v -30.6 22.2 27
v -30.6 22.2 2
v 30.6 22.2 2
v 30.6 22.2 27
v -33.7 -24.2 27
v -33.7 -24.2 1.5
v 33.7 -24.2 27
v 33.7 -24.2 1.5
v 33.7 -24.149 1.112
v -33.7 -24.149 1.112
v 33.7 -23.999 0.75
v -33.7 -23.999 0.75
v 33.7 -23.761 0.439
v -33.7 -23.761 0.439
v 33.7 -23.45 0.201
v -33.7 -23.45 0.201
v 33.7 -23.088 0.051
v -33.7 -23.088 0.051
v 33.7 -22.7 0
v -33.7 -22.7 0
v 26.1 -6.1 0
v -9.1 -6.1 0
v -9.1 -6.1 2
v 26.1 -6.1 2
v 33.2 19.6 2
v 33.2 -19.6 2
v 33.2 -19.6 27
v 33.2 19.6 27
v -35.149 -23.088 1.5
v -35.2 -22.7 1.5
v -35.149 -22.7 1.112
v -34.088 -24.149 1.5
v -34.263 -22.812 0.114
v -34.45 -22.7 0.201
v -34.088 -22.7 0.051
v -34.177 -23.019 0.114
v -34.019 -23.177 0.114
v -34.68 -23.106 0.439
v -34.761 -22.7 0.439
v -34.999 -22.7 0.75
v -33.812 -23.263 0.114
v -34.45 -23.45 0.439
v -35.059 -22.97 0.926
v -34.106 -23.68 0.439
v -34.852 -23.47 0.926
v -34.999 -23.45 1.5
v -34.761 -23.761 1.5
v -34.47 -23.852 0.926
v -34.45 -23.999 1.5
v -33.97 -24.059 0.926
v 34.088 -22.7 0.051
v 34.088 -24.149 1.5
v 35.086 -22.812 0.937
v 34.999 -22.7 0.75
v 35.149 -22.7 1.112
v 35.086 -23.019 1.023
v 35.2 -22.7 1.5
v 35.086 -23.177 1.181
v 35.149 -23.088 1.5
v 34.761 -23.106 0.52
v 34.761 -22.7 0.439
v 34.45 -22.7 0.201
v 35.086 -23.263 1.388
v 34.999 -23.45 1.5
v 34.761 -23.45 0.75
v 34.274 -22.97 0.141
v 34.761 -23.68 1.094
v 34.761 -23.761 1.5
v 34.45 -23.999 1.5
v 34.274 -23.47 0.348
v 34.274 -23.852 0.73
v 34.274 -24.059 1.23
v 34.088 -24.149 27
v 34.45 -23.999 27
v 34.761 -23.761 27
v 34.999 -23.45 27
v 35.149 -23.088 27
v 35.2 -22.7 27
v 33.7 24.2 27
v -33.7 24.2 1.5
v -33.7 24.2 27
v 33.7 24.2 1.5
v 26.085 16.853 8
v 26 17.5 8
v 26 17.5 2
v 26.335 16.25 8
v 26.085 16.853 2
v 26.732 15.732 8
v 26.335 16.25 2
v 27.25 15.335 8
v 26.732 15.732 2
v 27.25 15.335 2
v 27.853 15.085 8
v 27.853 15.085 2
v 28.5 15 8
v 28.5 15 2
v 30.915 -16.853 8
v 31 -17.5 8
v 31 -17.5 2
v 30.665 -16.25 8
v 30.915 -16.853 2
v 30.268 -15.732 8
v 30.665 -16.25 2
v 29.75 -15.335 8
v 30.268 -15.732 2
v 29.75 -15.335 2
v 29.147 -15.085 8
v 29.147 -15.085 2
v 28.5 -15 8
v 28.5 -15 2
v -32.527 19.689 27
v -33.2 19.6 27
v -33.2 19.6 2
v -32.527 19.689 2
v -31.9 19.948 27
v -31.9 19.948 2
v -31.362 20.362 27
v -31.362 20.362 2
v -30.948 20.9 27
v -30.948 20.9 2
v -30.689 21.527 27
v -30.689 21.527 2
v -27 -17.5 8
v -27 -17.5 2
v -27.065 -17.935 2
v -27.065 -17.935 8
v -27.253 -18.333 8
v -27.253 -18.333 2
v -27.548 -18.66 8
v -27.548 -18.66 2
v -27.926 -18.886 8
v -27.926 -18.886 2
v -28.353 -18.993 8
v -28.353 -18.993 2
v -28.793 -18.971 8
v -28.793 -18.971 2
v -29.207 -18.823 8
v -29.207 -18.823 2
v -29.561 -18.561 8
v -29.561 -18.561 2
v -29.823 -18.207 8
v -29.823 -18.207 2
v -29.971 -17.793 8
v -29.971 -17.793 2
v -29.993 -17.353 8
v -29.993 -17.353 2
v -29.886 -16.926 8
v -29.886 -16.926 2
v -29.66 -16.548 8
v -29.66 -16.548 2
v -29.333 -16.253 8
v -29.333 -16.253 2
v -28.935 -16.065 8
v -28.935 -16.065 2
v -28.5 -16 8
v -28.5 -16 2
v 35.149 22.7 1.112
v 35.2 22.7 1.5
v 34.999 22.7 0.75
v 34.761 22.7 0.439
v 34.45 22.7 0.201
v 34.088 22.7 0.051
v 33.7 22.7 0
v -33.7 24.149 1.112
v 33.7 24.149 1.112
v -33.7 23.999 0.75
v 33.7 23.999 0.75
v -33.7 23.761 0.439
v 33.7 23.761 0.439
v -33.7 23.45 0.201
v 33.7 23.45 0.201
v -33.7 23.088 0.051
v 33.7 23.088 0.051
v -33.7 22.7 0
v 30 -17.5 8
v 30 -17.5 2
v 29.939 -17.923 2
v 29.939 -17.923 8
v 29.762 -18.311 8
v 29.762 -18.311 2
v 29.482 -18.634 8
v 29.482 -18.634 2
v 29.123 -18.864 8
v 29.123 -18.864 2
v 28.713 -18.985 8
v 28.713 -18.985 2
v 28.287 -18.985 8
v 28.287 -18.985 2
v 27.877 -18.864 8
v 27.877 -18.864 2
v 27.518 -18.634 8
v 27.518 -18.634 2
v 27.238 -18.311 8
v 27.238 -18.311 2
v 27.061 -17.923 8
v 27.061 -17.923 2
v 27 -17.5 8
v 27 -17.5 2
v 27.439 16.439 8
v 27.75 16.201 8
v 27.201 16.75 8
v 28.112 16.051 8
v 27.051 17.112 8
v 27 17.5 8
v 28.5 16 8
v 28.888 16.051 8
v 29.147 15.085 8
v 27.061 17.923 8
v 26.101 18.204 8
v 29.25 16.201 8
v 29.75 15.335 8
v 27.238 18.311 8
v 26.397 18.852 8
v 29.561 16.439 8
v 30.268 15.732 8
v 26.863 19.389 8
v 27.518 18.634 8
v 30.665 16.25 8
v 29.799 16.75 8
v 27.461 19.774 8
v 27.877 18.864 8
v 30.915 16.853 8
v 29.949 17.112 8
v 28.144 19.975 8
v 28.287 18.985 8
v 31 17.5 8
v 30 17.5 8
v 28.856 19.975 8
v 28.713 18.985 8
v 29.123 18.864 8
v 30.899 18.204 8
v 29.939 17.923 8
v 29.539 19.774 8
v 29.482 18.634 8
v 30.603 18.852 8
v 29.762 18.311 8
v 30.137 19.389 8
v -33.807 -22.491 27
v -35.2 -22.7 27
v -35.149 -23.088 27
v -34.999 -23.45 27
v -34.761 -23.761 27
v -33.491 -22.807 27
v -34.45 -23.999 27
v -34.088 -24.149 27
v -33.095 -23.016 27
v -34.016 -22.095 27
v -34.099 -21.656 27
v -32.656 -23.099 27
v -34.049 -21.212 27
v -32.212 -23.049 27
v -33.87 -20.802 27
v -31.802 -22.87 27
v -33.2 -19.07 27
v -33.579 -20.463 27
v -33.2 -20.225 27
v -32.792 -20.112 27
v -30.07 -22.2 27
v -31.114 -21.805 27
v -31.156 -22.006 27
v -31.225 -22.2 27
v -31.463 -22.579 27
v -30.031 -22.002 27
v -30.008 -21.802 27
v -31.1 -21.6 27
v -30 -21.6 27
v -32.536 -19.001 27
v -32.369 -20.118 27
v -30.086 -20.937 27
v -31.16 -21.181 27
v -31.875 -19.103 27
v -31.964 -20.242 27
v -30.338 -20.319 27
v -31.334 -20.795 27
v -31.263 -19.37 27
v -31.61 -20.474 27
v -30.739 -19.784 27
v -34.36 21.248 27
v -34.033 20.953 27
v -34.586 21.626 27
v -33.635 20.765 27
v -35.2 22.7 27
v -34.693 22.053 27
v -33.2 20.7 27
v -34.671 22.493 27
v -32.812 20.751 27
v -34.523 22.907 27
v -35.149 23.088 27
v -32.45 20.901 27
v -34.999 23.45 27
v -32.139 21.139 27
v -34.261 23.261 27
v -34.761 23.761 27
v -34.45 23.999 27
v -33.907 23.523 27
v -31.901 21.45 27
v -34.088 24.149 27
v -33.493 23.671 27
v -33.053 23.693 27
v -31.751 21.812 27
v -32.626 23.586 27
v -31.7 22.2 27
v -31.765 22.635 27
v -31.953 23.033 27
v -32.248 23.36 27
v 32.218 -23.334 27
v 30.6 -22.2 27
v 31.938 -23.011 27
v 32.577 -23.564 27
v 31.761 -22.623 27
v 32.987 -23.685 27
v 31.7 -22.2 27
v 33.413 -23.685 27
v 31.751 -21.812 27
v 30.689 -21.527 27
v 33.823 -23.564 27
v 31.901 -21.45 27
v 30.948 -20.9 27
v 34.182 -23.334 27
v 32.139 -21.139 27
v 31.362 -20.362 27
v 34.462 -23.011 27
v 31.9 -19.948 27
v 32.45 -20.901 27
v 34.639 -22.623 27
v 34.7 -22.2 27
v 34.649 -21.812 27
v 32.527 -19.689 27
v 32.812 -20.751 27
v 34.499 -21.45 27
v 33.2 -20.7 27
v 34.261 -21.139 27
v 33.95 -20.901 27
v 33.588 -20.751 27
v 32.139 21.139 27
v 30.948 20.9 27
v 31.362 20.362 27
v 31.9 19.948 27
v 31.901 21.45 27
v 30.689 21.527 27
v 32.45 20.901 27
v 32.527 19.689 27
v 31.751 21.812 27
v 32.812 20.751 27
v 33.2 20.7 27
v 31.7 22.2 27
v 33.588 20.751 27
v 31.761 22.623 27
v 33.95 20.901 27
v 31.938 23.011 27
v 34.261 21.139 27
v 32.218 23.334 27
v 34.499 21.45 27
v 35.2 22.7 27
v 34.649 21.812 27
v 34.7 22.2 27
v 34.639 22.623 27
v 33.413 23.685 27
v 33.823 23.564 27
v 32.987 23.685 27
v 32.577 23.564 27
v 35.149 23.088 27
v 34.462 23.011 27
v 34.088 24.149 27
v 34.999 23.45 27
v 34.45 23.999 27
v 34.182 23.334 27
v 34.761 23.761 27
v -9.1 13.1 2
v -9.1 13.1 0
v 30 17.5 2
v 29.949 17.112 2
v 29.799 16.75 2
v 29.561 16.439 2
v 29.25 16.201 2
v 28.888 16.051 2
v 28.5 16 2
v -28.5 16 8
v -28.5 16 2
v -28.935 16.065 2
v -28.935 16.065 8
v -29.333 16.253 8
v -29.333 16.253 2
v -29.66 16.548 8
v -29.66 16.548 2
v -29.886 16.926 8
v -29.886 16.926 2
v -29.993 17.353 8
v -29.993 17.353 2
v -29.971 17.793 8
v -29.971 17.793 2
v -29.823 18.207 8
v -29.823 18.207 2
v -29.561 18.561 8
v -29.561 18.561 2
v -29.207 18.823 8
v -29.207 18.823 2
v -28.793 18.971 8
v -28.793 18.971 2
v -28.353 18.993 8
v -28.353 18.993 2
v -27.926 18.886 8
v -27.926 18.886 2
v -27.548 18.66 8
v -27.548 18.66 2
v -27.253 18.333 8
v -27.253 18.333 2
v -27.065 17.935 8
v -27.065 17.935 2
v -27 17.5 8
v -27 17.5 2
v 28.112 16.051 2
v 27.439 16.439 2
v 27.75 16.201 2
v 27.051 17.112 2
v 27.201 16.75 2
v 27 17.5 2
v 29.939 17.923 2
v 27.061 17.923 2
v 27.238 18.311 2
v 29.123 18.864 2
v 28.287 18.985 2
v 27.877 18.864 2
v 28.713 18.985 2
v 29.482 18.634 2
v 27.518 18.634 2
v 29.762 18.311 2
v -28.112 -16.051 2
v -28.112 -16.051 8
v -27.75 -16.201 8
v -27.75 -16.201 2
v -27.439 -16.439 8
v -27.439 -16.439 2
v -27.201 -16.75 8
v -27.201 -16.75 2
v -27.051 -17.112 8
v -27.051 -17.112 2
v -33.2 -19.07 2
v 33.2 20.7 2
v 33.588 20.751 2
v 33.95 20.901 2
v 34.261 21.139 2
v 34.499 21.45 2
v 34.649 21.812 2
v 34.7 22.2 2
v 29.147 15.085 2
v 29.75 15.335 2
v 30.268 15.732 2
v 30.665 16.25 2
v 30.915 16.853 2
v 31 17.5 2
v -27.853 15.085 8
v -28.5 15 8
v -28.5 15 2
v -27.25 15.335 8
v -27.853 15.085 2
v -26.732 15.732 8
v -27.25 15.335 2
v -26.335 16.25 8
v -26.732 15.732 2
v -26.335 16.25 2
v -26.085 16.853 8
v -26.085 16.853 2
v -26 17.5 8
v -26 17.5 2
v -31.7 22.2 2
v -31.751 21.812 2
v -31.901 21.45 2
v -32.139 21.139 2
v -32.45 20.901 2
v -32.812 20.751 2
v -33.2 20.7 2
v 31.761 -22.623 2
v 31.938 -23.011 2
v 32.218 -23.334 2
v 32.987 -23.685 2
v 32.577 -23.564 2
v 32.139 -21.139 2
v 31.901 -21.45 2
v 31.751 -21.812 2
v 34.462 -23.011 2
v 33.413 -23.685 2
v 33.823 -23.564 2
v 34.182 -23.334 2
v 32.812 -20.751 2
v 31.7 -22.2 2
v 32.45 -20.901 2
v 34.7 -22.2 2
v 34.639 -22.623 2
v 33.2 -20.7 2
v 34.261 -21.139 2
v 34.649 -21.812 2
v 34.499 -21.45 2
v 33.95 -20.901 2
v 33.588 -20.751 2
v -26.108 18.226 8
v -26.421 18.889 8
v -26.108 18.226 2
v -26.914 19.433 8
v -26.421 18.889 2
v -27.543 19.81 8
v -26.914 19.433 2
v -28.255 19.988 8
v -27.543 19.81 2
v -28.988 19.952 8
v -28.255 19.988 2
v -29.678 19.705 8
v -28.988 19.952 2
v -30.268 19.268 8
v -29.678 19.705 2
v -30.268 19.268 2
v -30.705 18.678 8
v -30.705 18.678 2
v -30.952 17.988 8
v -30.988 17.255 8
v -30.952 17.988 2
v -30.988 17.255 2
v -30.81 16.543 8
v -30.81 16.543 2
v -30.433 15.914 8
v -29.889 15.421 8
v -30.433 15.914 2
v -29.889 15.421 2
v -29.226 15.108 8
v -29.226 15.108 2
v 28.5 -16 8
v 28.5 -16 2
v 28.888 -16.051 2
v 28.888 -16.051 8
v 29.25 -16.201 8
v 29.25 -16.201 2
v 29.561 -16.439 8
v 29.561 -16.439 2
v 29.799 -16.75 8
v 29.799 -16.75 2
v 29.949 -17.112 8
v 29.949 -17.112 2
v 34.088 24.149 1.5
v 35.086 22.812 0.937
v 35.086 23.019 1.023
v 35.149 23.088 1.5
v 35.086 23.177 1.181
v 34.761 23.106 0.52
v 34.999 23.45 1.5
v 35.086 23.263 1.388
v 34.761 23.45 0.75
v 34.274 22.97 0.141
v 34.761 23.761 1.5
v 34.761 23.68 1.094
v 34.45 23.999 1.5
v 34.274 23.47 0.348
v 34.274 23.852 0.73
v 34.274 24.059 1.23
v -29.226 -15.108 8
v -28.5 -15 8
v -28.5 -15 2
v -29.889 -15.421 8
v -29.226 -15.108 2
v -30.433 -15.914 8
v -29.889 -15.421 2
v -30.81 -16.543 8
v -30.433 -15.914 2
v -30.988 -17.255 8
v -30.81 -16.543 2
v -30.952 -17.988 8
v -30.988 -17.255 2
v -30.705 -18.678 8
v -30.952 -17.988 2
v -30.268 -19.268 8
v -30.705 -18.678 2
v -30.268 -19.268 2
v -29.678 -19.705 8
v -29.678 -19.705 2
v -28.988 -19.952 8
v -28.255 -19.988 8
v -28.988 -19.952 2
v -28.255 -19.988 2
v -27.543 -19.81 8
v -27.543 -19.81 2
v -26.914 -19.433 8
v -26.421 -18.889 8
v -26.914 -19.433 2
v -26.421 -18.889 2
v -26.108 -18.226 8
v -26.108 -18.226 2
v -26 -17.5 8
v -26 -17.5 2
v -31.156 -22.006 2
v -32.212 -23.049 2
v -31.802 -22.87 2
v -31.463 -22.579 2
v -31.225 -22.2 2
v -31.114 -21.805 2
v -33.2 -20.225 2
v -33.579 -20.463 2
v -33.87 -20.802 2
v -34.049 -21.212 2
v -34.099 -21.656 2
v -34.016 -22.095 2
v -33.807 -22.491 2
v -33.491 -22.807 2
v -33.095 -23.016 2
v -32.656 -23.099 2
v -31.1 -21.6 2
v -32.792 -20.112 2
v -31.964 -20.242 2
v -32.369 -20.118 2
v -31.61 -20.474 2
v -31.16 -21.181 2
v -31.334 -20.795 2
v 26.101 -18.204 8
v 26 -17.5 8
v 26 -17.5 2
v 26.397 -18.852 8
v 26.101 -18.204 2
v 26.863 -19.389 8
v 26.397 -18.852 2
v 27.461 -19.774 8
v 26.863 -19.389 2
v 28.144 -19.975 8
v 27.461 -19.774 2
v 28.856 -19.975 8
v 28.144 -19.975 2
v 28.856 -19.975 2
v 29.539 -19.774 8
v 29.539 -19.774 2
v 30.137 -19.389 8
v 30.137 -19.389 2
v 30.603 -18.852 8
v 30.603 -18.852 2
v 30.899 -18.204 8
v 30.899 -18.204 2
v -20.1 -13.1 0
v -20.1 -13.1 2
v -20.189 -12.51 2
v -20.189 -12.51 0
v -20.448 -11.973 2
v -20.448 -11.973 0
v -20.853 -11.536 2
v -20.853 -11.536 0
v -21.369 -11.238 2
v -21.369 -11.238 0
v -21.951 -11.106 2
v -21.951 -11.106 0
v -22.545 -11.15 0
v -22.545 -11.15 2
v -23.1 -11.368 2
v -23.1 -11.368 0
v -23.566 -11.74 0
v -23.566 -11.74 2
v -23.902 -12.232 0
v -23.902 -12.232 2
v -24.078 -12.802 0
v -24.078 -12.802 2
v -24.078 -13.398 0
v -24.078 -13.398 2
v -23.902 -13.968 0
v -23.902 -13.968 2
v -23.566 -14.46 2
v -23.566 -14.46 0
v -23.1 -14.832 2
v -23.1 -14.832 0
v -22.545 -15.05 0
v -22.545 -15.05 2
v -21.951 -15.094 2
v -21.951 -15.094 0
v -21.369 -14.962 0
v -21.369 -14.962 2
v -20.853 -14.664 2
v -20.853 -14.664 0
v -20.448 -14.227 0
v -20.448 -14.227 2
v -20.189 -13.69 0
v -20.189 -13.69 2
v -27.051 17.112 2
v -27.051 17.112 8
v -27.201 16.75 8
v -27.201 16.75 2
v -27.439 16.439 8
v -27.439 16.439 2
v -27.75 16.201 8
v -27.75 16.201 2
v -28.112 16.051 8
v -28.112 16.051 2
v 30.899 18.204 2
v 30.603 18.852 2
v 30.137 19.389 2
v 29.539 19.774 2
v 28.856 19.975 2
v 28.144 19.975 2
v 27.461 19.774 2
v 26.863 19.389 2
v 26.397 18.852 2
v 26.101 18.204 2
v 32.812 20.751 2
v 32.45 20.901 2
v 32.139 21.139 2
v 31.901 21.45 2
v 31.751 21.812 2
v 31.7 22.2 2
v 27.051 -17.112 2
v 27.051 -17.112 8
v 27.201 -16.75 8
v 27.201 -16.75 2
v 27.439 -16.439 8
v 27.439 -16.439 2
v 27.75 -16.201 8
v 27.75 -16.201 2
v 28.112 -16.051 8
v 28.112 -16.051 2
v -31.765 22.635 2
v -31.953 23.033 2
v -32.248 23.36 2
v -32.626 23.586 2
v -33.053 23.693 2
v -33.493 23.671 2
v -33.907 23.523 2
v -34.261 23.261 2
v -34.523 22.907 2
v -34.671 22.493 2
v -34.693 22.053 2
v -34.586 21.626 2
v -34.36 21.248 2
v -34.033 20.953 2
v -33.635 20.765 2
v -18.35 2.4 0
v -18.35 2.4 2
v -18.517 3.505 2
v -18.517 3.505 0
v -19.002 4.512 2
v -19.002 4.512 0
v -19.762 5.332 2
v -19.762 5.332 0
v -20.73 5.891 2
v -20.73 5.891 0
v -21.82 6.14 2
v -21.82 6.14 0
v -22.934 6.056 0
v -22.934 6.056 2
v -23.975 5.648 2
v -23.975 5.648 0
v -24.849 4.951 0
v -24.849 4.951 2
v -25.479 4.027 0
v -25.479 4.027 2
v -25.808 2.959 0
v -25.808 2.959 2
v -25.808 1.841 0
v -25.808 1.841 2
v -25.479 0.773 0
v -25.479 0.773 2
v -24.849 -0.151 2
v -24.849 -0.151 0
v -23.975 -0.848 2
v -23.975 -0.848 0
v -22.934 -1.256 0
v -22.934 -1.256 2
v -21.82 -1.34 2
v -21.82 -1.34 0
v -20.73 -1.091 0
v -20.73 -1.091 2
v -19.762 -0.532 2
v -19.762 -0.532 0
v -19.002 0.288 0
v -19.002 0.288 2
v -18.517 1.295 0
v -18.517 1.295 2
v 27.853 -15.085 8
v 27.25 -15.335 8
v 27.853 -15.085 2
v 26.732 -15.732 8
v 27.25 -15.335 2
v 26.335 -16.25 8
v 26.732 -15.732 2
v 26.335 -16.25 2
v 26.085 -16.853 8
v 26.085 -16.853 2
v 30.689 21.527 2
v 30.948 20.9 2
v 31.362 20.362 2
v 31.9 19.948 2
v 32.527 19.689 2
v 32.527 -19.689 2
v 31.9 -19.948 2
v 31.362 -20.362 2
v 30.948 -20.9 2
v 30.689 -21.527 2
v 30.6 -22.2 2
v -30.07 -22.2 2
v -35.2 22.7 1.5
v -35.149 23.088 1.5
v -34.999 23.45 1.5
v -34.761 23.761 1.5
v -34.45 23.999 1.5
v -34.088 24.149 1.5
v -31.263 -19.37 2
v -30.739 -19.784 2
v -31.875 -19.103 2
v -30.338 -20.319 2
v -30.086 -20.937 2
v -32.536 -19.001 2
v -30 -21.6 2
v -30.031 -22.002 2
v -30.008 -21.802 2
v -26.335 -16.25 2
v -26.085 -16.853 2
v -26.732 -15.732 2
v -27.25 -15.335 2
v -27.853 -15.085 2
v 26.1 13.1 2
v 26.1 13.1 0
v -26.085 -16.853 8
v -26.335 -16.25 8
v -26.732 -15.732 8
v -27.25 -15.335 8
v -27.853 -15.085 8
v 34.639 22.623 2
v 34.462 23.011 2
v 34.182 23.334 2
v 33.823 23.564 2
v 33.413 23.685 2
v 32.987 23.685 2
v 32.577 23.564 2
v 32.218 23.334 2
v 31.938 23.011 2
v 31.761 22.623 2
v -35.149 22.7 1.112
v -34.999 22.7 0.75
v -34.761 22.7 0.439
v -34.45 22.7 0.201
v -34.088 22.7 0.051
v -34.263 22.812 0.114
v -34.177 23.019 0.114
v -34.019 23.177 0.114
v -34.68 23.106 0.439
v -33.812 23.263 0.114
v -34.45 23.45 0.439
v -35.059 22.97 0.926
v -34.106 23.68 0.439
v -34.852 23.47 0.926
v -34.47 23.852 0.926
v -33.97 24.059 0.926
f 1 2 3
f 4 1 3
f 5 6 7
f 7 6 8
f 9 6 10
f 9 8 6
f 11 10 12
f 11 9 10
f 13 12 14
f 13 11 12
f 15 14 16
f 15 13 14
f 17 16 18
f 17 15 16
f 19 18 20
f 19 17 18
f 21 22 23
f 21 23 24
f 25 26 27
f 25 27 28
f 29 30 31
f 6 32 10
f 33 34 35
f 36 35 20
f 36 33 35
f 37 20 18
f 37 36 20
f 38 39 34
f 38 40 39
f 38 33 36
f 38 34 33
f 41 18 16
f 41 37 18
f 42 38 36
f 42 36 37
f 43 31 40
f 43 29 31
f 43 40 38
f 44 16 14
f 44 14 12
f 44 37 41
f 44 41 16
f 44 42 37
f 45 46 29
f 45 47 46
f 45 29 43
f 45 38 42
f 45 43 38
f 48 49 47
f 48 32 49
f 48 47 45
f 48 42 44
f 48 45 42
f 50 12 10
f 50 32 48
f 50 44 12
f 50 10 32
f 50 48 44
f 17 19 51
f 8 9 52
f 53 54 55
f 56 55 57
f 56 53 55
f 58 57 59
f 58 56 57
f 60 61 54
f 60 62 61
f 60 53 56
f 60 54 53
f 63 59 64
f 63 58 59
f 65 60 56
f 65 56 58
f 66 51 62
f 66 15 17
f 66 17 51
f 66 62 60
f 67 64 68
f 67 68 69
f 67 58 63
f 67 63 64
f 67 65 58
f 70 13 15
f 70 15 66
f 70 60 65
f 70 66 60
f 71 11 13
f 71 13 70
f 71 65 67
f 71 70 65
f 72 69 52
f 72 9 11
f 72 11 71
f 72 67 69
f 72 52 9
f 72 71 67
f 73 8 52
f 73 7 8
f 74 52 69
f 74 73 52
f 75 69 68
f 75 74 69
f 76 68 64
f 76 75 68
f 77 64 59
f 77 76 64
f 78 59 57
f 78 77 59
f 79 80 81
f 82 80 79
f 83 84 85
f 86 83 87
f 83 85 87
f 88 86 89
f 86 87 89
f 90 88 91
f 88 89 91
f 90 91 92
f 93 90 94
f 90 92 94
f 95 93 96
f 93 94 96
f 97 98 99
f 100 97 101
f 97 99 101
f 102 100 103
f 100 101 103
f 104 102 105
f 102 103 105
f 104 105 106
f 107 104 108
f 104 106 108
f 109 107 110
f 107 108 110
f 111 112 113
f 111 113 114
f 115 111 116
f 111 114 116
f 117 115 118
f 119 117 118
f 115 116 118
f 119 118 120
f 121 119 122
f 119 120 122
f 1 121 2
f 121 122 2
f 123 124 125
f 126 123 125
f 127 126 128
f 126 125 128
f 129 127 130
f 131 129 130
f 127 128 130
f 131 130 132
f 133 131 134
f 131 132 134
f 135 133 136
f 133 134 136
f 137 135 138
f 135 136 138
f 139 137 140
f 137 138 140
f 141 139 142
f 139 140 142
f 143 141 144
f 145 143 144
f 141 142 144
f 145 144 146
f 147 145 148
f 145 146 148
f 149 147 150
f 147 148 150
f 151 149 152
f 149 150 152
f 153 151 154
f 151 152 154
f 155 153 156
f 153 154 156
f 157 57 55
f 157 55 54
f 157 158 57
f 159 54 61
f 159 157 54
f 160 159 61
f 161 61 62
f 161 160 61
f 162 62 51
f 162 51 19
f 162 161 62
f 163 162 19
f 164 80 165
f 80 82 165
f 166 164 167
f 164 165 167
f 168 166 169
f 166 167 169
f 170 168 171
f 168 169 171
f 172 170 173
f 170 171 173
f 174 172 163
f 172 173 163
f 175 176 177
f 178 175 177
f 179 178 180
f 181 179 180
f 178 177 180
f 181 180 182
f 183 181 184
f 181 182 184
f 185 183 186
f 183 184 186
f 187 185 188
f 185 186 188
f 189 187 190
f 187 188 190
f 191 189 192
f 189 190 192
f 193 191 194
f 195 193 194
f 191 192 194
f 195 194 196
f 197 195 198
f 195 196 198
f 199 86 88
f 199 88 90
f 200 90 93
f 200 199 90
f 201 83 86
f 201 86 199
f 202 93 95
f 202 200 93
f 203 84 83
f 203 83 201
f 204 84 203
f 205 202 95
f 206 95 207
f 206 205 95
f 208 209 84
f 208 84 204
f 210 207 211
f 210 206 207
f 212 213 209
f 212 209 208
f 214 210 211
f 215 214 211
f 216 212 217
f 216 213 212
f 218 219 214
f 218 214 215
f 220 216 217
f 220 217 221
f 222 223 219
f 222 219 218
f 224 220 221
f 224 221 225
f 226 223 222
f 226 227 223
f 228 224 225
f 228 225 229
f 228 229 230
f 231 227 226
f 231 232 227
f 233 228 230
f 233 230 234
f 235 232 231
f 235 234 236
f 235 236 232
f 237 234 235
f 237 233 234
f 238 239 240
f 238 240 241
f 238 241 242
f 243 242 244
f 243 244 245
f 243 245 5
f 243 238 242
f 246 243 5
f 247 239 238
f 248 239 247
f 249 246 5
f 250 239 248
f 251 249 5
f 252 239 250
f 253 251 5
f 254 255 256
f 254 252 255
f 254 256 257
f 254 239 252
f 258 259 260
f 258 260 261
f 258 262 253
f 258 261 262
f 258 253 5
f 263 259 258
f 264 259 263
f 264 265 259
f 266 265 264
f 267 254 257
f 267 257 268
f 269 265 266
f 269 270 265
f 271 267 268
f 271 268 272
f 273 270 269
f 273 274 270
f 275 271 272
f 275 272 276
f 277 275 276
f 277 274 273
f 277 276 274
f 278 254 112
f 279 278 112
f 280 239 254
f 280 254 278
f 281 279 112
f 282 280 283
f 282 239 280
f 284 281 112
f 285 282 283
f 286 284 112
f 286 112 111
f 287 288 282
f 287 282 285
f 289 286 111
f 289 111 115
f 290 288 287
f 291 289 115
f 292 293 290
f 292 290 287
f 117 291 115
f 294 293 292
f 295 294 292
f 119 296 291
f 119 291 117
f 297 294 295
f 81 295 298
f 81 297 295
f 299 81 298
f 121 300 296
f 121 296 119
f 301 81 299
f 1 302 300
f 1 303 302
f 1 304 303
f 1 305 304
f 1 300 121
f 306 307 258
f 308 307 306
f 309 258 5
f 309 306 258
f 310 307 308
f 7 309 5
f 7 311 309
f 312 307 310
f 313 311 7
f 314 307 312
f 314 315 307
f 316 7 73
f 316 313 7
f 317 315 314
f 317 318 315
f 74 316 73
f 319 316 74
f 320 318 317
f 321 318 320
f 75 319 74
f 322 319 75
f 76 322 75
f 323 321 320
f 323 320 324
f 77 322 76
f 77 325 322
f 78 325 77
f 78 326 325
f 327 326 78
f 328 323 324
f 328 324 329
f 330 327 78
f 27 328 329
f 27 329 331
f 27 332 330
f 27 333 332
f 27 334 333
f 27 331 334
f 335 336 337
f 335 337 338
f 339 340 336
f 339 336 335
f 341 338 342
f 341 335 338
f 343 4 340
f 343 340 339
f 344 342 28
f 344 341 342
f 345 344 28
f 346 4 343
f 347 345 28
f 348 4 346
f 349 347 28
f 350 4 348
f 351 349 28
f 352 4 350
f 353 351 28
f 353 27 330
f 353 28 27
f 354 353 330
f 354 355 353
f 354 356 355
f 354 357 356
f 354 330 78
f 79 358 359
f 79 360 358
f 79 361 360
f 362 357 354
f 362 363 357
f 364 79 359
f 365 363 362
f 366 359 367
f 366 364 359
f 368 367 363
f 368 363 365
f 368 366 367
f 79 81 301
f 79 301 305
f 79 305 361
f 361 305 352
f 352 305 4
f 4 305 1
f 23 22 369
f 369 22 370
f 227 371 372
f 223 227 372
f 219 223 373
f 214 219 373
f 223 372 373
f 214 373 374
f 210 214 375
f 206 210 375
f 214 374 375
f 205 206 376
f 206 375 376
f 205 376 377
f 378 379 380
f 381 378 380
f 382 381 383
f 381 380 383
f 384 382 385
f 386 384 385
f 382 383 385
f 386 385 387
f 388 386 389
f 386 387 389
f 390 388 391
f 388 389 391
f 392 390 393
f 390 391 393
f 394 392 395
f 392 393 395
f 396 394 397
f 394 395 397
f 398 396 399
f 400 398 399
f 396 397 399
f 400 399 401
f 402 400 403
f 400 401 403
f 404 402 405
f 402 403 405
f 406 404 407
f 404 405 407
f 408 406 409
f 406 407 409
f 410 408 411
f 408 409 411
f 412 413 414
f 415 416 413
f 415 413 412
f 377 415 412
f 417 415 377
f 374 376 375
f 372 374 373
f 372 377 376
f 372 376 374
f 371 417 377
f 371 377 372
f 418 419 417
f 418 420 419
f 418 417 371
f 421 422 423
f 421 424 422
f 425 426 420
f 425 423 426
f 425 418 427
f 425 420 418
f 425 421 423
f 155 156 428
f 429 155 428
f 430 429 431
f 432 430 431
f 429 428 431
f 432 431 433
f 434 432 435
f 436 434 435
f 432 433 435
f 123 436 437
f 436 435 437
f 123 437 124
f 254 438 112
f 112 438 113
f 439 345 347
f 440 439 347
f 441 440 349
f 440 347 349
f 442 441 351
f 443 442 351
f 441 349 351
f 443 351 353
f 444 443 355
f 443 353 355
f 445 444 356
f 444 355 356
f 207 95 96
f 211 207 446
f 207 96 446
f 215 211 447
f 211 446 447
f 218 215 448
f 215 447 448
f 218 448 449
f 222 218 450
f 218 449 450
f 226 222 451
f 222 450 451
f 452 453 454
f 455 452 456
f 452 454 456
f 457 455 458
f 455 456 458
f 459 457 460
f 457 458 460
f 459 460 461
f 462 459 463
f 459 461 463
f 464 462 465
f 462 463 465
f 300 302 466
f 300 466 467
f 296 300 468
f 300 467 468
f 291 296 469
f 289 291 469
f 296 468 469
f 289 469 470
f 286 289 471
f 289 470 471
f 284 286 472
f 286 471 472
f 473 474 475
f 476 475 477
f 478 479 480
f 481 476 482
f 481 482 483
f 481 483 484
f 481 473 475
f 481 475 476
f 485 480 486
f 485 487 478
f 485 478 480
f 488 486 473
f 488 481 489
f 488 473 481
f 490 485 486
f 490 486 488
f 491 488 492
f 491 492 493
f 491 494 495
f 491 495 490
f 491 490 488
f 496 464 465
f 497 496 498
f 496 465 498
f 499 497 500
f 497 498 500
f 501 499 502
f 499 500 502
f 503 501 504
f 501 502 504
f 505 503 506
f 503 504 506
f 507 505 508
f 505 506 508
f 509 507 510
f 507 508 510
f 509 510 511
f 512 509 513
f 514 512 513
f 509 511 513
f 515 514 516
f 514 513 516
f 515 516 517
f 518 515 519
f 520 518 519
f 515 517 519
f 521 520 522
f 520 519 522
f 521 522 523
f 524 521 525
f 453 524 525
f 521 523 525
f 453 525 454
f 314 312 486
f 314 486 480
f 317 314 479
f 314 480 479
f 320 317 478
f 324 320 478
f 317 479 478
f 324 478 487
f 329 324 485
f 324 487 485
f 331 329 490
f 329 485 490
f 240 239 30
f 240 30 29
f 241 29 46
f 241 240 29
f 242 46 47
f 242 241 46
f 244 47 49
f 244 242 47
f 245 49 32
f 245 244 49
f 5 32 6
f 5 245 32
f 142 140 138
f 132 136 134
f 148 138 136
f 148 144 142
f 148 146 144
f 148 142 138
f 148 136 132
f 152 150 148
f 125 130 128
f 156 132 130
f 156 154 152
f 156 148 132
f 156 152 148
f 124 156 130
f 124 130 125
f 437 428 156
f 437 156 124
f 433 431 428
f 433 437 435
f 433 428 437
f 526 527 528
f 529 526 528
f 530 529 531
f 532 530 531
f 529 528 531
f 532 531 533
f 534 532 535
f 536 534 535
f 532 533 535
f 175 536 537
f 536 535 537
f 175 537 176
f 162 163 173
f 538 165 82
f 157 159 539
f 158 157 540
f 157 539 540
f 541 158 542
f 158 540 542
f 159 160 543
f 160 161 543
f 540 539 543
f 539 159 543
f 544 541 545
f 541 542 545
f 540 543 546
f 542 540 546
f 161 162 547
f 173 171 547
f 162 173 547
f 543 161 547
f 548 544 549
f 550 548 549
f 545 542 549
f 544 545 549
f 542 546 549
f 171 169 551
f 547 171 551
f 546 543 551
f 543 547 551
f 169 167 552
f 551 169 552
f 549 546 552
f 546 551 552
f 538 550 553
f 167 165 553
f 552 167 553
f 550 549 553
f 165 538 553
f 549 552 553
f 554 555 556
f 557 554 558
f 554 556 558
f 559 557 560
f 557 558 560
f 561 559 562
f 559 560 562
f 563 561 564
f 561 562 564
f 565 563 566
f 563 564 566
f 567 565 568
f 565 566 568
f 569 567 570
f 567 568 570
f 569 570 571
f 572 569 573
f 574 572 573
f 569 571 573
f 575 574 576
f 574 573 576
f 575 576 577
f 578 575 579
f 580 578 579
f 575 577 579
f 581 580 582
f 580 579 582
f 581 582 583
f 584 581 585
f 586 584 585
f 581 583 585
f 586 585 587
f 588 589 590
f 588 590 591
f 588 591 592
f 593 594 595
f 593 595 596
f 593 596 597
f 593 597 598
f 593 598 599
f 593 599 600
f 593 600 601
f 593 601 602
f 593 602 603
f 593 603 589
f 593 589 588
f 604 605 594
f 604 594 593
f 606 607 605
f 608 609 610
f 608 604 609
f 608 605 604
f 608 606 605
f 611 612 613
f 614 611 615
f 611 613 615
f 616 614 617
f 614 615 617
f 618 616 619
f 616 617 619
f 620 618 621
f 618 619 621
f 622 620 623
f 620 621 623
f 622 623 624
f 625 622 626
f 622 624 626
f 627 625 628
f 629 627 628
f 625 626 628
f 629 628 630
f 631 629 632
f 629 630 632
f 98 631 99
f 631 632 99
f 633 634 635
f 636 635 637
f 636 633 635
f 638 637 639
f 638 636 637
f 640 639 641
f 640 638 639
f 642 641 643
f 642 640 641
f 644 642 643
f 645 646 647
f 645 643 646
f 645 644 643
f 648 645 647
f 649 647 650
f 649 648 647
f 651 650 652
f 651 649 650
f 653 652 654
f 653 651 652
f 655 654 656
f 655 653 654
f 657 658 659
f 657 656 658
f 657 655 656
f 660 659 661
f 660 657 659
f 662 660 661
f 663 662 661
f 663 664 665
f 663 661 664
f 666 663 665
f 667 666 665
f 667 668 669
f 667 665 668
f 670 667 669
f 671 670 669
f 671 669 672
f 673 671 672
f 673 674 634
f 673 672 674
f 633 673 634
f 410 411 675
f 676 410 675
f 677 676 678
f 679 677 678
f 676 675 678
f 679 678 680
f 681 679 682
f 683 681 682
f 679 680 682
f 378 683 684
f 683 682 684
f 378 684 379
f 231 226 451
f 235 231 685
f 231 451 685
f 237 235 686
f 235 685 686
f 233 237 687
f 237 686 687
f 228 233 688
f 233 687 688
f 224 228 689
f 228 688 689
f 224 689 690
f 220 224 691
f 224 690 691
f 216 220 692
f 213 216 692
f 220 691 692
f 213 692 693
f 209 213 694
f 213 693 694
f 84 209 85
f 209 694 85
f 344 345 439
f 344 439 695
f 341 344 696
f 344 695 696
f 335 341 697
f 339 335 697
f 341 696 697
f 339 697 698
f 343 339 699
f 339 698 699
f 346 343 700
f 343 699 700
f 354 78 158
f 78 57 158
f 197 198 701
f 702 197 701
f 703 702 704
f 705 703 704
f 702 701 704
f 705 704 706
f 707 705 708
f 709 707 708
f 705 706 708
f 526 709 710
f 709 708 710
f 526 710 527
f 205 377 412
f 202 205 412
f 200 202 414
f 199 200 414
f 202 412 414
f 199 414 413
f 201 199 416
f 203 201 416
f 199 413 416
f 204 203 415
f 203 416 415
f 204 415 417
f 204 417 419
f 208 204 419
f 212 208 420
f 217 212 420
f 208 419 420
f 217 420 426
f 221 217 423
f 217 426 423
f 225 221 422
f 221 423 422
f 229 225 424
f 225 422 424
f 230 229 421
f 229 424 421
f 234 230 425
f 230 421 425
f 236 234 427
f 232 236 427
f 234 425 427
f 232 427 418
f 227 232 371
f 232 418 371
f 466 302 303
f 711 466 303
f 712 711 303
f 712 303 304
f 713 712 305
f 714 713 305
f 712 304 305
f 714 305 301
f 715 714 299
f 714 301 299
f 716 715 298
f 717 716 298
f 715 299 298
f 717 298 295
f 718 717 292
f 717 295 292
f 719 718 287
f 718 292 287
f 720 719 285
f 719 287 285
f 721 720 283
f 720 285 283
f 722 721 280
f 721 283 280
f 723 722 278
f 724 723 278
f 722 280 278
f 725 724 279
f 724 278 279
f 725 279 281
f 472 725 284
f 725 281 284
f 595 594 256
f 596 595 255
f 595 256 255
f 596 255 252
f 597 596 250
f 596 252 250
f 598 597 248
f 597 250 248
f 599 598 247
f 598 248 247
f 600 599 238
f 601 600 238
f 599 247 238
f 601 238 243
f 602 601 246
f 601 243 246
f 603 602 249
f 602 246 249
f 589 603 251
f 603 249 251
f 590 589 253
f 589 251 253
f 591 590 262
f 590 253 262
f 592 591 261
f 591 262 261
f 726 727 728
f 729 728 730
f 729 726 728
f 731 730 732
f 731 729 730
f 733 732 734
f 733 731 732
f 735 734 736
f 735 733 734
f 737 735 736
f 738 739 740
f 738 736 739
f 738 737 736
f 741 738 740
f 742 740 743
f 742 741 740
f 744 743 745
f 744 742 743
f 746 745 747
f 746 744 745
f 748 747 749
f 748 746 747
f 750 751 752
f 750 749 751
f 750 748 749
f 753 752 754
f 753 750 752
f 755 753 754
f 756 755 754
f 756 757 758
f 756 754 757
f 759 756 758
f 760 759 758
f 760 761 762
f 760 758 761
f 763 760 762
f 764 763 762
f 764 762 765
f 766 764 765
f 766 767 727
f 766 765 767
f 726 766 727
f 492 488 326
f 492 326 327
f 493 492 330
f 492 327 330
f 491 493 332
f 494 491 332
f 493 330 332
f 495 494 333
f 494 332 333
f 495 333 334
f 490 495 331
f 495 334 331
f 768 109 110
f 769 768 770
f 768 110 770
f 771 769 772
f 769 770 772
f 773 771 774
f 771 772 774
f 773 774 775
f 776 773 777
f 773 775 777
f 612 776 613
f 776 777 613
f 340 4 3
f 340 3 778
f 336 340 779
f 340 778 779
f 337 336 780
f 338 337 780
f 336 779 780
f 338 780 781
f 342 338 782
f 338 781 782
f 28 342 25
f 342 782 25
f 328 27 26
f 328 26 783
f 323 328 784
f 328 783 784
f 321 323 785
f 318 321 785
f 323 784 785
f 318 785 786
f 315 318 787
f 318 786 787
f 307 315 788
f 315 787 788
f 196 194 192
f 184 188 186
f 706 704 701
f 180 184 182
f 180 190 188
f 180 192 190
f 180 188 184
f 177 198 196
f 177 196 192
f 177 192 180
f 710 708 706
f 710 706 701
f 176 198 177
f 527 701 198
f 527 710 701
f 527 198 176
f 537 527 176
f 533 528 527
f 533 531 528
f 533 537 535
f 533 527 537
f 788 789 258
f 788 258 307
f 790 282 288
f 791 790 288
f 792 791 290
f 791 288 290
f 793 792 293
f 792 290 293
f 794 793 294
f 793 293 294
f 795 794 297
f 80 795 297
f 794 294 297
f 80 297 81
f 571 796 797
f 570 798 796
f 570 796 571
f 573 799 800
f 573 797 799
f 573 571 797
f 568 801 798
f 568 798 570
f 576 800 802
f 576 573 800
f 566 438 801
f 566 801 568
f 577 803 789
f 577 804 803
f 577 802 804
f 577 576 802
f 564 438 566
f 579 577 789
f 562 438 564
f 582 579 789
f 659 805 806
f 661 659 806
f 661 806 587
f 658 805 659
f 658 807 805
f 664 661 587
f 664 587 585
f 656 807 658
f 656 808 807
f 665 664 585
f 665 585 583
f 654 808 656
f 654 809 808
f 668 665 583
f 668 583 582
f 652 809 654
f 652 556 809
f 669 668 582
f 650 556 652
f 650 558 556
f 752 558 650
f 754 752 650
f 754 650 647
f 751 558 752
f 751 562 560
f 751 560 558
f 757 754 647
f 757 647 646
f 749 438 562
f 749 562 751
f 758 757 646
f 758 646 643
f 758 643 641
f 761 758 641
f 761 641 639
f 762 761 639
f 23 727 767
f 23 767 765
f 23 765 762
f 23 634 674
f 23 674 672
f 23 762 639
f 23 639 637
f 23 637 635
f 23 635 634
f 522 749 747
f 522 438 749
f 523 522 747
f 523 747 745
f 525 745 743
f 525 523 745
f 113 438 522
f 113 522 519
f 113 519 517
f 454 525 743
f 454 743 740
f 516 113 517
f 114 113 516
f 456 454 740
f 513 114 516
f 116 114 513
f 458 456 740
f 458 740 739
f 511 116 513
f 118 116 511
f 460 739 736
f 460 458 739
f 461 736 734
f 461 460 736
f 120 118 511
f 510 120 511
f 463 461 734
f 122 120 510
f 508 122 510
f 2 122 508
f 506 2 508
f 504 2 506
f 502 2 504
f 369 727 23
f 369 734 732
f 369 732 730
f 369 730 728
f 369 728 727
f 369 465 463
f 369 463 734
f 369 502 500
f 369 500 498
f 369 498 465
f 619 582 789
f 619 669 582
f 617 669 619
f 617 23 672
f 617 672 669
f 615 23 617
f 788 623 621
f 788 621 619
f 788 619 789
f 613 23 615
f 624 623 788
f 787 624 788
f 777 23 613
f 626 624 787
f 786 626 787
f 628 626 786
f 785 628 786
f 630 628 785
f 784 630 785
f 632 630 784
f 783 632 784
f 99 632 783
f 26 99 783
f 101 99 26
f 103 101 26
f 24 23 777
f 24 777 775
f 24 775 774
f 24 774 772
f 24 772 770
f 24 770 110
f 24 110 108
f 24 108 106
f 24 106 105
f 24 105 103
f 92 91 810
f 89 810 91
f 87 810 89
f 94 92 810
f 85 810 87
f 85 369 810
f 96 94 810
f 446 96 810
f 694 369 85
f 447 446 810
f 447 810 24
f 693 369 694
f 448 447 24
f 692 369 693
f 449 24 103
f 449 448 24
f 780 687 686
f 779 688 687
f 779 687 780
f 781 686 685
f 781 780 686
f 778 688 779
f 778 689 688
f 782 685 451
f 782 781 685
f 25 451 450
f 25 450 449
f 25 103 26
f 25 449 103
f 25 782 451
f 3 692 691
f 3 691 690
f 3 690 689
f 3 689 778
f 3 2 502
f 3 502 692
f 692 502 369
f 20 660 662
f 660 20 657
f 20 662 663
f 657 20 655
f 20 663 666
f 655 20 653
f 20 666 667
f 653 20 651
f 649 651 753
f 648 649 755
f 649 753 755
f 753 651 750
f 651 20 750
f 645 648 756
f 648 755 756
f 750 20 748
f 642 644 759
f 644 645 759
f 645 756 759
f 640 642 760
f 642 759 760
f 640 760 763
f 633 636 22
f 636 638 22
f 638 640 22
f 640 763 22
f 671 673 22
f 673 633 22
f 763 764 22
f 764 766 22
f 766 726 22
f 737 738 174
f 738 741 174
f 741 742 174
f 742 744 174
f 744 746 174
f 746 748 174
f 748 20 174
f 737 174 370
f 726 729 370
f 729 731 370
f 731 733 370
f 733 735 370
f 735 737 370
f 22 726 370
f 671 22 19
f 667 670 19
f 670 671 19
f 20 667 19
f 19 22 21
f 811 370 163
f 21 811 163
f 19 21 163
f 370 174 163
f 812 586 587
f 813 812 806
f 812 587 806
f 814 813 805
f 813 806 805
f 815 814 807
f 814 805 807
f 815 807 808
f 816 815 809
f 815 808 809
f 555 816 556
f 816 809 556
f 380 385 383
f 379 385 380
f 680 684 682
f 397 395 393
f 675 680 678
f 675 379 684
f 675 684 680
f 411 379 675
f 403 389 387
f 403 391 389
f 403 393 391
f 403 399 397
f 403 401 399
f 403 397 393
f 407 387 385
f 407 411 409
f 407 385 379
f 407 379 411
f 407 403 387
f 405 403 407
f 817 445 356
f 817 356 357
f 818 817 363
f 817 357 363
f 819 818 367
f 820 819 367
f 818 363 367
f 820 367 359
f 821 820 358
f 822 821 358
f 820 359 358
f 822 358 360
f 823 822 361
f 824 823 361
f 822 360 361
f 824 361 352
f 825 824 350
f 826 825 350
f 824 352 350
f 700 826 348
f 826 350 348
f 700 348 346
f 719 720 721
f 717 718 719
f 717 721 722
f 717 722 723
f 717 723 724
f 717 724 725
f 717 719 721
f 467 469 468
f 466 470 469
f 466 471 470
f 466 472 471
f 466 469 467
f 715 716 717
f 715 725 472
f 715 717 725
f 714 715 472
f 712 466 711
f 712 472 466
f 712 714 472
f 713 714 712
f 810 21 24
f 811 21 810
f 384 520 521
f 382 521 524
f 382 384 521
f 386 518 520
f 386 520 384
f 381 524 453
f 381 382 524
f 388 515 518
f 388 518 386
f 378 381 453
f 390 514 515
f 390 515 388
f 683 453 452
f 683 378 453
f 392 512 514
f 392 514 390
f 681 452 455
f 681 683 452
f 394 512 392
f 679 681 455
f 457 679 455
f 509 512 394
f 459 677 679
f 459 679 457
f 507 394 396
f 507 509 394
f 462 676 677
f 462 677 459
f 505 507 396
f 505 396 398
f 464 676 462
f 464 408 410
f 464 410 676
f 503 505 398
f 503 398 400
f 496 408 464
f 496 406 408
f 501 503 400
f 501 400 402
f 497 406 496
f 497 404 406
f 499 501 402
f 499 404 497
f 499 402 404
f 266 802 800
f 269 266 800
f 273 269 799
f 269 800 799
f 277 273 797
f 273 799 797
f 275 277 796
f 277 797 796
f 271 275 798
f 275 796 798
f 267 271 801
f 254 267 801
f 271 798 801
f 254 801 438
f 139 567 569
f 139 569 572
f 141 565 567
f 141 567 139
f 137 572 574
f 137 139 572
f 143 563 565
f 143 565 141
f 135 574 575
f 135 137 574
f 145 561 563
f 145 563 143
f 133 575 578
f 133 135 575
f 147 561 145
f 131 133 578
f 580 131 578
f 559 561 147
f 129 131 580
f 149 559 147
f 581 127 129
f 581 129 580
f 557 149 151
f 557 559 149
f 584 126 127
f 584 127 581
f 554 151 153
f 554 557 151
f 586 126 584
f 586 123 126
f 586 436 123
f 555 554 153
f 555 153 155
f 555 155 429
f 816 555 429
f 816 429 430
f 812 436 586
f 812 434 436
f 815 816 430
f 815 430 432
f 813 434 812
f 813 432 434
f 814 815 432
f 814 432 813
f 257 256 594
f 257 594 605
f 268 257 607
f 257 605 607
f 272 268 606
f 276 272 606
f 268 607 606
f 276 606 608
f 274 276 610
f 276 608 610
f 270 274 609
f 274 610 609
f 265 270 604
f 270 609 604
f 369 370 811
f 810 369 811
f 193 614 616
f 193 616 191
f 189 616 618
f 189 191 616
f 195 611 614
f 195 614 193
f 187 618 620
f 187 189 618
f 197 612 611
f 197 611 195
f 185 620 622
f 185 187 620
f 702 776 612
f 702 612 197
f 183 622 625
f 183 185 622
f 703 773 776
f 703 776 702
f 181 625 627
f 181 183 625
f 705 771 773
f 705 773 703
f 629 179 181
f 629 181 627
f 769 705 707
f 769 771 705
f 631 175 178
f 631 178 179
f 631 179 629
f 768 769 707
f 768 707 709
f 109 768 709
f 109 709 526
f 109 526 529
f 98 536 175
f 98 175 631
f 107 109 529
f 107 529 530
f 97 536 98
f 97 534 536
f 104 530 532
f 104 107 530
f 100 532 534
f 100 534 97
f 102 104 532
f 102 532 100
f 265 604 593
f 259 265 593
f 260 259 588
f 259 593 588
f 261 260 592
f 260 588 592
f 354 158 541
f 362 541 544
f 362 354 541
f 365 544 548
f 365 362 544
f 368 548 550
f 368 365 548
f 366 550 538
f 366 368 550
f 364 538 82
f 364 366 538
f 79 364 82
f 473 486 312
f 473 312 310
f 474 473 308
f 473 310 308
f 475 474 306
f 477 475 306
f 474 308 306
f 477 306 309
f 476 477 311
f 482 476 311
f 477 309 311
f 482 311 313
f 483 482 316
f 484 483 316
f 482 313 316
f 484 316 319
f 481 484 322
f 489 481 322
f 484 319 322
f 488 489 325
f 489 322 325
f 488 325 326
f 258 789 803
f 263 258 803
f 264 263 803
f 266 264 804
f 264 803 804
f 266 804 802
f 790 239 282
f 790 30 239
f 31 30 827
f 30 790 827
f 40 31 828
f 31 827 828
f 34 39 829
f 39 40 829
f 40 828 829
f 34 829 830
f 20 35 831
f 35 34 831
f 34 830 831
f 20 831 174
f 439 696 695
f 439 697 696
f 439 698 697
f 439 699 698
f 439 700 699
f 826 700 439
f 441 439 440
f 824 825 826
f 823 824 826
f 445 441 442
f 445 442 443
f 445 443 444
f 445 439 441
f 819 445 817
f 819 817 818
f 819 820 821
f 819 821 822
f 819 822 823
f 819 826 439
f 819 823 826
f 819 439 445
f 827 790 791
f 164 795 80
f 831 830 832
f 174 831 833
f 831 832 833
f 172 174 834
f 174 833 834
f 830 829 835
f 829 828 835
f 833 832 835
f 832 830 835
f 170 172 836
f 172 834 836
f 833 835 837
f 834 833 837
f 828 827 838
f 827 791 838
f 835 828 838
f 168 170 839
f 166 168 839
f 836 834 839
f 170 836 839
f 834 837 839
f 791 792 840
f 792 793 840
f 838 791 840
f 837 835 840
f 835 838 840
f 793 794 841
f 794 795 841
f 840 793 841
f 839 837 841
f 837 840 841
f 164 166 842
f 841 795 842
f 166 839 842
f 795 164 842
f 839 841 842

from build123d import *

# Parameters (mm, degrees)
F0_W      = 70.4
F0_H      = 48.4
F2_DEPTH  = 27
F3_T      = -2
F4_R      = 1.5
F1_R      = 2
F1_R_2    = 3.75
F5_DEPTH  = 25
F6_DEPTH  = 8
F1_W      = 35.2
F1_H      = 19.2
F7_DEPTH  = 25
F9_DEPTH  = 25
F11_DEPTH = 25


# Not quite as in the source:
# - a feature names something its author has since deleted; it is built from what else it names


with BuildPart() as f2:
    # F0 (on Top) → F2 (new body)
    with BuildSketch(Plane.XY):
        Rectangle(F0_W, F0_H)
    extrude(amount=F2_DEPTH)

    # F3
    f3_openings = [f2.faces().sort_by_distance(p)[0] for p in [
        (0, 0, 27),
    ]]
    offset(amount=F3_T, openings=f3_openings)

    # F4
    f4_edges = [f2.edges().sort_by_distance(p)[0] for p in [
        (-35.2, 24.2, 13.5),
        (-35.2, -24.2, 13.5),
        (-35.2, 0, 0),
        (0, 24.2, 0),
        (0, -24.2, 0),
        (35.2, 0, 0),
        (35.2, -24.2, 13.5),
        (35.2, 24.2, 13.5),
    ]]
    fillet(f4_edges, radius=F4_R)

    # F1 (on Top) → F5 (cut)
    with BuildSketch(Plane.XY):
        with Locations((-22.1, -13.1)):
            Circle(F1_R)
        with Locations((-22.1, 2.4)):
            Circle(F1_R_2)
    extrude(amount=F5_DEPTH, mode=Mode.SUBTRACT)

    # F1 (on Top) → F6 (join)
    with BuildSketch(Plane.XY):
        with BuildLine():
            Line((27, 17.5), (26, 17.5))
            ThreePointArc((26, 17.5), (26.732233047, 15.732233047), (28.5, 15))
            Line((28.5, 15), (28.5, 16))
            ThreePointArc((28.5, 16), (27.4393398282, 16.4393398282), (27, 17.5))
        make_face()
        with BuildLine():
            ThreePointArc((31, 17.5), (28.5, 20), (26, 17.5))
            Line((26, 17.5), (27, 17.5))
            ThreePointArc((27, 17.5), (28.5, 19), (30, 17.5))
            ThreePointArc((30, 17.5), (29.5606601718, 16.4393398282), (28.5, 16))
            Line((28.5, 16), (28.5, 15))
            ThreePointArc((28.5, 15), (30.267766953, 15.732233047), (31, 17.5))
        make_face()
        with BuildLine():
            Line((28.5, -16), (28.5, -15))
            ThreePointArc((28.5, -15), (26.732233047, -15.732233047), (26, -17.5))
            Line((26, -17.5), (27, -17.5))
            ThreePointArc((27, -17.5), (27.4393398282, -16.4393398282), (28.5, -16))
        make_face()
        with BuildLine():
            ThreePointArc((31, -17.5), (30.267766953, -15.732233047), (28.5, -15))
            Line((28.5, -15), (28.5, -16))
            ThreePointArc((28.5, -16), (29.5606601718, -16.4393398282), (30, -17.5))
            ThreePointArc((30, -17.5), (28.5, -19), (27, -17.5))
            Line((27, -17.5), (26, -17.5))
            ThreePointArc((26, -17.5), (28.5, -20), (31, -17.5))
        make_face()
        with BuildLine():
            Line((-28.5, -16), (-28.5, -15))
            ThreePointArc((-28.5, -15), (-30.267766953, -19.267766953), (-26, -17.5))
            Line((-26, -17.5), (-27, -17.5))
            ThreePointArc((-27, -17.5), (-29.5606601718, -18.5606601718), (-28.5, -16))
        make_face()
        with BuildLine():
            ThreePointArc((-26, -17.5), (-26.732233047, -15.732233047), (-28.5, -15))
            Line((-28.5, -15), (-28.5, -16))
            ThreePointArc((-28.5, -16), (-27.4393398282, -16.4393398282), (-27, -17.5))
            Line((-27, -17.5), (-26, -17.5))
        make_face()
        with BuildLine():
            Line((-27, 17.5), (-26, 17.5))
            ThreePointArc((-26, 17.5), (-30.267766953, 19.267766953), (-28.5, 15))
            Line((-28.5, 15), (-28.5, 16))
            ThreePointArc((-28.5, 16), (-29.5606601718, 18.5606601718), (-27, 17.5))
        make_face()
        with BuildLine():
            ThreePointArc((-28.5, 15), (-26.732233047, 15.732233047), (-26, 17.5))
            Line((-26, 17.5), (-27, 17.5))
            ThreePointArc((-27, 17.5), (-27.4393398282, 16.4393398282), (-28.5, 16))
            Line((-28.5, 16), (-28.5, 15))
        make_face()
    extrude(amount=F6_DEPTH)

    # F1 (on Top) → F7 (cut)
    with BuildSketch(Plane.XY):
        with Locations((8.5, 3.5)):
            Rectangle(F1_W, F1_H)
    extrude(amount=F7_DEPTH, mode=Mode.SUBTRACT)

    # F8 (on face) → F9 (join)
    with BuildSketch(Plane.XY.offset(2)):
        with BuildLine():
            ThreePointArc((-33.2, 19.6), (-31.3615223689, 20.3615223689), (-30.6, 22.2))
            Line((-30.6, 22.2), (-31.7, 22.2))
            ThreePointArc((-31.7, 22.2), (-32.1393398282, 21.1393398282), (-33.2, 20.7))
            Line((-33.2, 20.7), (-33.2, 19.6))
        make_face()
        with BuildLine():
            Line((31.7, 22.2), (30.6, 22.2))
            ThreePointArc((30.6, 22.2), (31.3615223689, 20.3615223689), (33.2, 19.6))
            Line((33.2, 19.6), (33.2, 20.7))
            ThreePointArc((33.2, 20.7), (32.1393398282, 21.1393398282), (31.7, 22.2))
        make_face()
        with BuildLine():
            Line((33.2, -20.7), (33.2, -19.6))
            ThreePointArc((33.2, -19.6), (31.3615223689, -20.3615223689), (30.6, -22.2))
            Line((30.6, -22.2), (31.7, -22.2))
            ThreePointArc((31.7, -22.2), (32.1393398282, -21.1393398282), (33.2, -20.7))
        make_face()
        with BuildLine():
            ThreePointArc((-30, -21.6), (-30.9875484503, -19.5603921946), (-33.2, -19.0701778719))
            Line((-33.2, -19.0701778719), (-33.2, -20.2252272915))
            ThreePointArc((-33.2, -20.2252272915), (-31.7784161637, -20.3450099602), (-31.1, -21.6))
            ThreePointArc((-31.1, -21.6), (-31.1316405306, -21.9064644655), (-31.2252272915, -22.2))
            Line((-31.2252272915, -22.2), (-30.0701778719, -22.2))
            ThreePointArc((-30.0701778719, -22.2), (-30.0176040647, -21.9020450851), (-30, -21.6))
        make_face()
    extrude(amount=F9_DEPTH)

    # F10 (on face) → F11 (cut)
    with BuildSketch(Plane.XY.offset(27)):
        with BuildLine():
            Line((-33.2, 22.2), (-31.7, 22.2))
            ThreePointArc((-31.7, 22.2), (-34.2606601718, 23.2606601718), (-33.2, 20.7))
            Line((-33.2, 20.7), (-33.2, 22.2))
        make_face()
        with BuildLine():
            ThreePointArc((-33.2, 20.7), (-32.1393398282, 21.1393398282), (-31.7, 22.2))
            Line((-31.7, 22.2), (-33.2, 22.2))
            Line((-33.2, 22.2), (-33.2, 20.7))
        make_face()
        with BuildLine():
            ThreePointArc((33.2, 20.7), (34.2606601718, 21.1393398282), (34.7, 22.2))
            ThreePointArc((34.7, 22.2), (33.2, 23.7), (31.7, 22.2))
            Line((31.7, 22.2), (33.2, 22.2))
            Line((33.2, 22.2), (33.2, 20.7))
        make_face()
        with BuildLine():
            Line((33.2, 22.2), (31.7, 22.2))
            ThreePointArc((31.7, 22.2), (32.1393398282, 21.1393398282), (33.2, 20.7))
            Line((33.2, 20.7), (33.2, 22.2))
        make_face()
        with BuildLine():
            ThreePointArc((31.7, -22.2), (33.2, -23.7), (34.7, -22.2))
            ThreePointArc((34.7, -22.2), (34.2606601718, -21.1393398282), (33.2, -20.7))
            Line((33.2, -20.7), (33.2, -22.2))
            Line((33.2, -22.2), (31.7, -22.2))
        make_face()
        with BuildLine():
            Line((-33.2, -22.2), (-33.2, -20.2252272915))
            ThreePointArc((-33.2, -20.2252272915), (-33.6606601718, -22.6606601718), (-31.2252272915, -22.2))
            Line((-31.2252272915, -22.2), (-33.2, -22.2))
        make_face()
    extrude(amount=-F11_DEPTH, mode=Mode.SUBTRACT)


solid = f2.part
